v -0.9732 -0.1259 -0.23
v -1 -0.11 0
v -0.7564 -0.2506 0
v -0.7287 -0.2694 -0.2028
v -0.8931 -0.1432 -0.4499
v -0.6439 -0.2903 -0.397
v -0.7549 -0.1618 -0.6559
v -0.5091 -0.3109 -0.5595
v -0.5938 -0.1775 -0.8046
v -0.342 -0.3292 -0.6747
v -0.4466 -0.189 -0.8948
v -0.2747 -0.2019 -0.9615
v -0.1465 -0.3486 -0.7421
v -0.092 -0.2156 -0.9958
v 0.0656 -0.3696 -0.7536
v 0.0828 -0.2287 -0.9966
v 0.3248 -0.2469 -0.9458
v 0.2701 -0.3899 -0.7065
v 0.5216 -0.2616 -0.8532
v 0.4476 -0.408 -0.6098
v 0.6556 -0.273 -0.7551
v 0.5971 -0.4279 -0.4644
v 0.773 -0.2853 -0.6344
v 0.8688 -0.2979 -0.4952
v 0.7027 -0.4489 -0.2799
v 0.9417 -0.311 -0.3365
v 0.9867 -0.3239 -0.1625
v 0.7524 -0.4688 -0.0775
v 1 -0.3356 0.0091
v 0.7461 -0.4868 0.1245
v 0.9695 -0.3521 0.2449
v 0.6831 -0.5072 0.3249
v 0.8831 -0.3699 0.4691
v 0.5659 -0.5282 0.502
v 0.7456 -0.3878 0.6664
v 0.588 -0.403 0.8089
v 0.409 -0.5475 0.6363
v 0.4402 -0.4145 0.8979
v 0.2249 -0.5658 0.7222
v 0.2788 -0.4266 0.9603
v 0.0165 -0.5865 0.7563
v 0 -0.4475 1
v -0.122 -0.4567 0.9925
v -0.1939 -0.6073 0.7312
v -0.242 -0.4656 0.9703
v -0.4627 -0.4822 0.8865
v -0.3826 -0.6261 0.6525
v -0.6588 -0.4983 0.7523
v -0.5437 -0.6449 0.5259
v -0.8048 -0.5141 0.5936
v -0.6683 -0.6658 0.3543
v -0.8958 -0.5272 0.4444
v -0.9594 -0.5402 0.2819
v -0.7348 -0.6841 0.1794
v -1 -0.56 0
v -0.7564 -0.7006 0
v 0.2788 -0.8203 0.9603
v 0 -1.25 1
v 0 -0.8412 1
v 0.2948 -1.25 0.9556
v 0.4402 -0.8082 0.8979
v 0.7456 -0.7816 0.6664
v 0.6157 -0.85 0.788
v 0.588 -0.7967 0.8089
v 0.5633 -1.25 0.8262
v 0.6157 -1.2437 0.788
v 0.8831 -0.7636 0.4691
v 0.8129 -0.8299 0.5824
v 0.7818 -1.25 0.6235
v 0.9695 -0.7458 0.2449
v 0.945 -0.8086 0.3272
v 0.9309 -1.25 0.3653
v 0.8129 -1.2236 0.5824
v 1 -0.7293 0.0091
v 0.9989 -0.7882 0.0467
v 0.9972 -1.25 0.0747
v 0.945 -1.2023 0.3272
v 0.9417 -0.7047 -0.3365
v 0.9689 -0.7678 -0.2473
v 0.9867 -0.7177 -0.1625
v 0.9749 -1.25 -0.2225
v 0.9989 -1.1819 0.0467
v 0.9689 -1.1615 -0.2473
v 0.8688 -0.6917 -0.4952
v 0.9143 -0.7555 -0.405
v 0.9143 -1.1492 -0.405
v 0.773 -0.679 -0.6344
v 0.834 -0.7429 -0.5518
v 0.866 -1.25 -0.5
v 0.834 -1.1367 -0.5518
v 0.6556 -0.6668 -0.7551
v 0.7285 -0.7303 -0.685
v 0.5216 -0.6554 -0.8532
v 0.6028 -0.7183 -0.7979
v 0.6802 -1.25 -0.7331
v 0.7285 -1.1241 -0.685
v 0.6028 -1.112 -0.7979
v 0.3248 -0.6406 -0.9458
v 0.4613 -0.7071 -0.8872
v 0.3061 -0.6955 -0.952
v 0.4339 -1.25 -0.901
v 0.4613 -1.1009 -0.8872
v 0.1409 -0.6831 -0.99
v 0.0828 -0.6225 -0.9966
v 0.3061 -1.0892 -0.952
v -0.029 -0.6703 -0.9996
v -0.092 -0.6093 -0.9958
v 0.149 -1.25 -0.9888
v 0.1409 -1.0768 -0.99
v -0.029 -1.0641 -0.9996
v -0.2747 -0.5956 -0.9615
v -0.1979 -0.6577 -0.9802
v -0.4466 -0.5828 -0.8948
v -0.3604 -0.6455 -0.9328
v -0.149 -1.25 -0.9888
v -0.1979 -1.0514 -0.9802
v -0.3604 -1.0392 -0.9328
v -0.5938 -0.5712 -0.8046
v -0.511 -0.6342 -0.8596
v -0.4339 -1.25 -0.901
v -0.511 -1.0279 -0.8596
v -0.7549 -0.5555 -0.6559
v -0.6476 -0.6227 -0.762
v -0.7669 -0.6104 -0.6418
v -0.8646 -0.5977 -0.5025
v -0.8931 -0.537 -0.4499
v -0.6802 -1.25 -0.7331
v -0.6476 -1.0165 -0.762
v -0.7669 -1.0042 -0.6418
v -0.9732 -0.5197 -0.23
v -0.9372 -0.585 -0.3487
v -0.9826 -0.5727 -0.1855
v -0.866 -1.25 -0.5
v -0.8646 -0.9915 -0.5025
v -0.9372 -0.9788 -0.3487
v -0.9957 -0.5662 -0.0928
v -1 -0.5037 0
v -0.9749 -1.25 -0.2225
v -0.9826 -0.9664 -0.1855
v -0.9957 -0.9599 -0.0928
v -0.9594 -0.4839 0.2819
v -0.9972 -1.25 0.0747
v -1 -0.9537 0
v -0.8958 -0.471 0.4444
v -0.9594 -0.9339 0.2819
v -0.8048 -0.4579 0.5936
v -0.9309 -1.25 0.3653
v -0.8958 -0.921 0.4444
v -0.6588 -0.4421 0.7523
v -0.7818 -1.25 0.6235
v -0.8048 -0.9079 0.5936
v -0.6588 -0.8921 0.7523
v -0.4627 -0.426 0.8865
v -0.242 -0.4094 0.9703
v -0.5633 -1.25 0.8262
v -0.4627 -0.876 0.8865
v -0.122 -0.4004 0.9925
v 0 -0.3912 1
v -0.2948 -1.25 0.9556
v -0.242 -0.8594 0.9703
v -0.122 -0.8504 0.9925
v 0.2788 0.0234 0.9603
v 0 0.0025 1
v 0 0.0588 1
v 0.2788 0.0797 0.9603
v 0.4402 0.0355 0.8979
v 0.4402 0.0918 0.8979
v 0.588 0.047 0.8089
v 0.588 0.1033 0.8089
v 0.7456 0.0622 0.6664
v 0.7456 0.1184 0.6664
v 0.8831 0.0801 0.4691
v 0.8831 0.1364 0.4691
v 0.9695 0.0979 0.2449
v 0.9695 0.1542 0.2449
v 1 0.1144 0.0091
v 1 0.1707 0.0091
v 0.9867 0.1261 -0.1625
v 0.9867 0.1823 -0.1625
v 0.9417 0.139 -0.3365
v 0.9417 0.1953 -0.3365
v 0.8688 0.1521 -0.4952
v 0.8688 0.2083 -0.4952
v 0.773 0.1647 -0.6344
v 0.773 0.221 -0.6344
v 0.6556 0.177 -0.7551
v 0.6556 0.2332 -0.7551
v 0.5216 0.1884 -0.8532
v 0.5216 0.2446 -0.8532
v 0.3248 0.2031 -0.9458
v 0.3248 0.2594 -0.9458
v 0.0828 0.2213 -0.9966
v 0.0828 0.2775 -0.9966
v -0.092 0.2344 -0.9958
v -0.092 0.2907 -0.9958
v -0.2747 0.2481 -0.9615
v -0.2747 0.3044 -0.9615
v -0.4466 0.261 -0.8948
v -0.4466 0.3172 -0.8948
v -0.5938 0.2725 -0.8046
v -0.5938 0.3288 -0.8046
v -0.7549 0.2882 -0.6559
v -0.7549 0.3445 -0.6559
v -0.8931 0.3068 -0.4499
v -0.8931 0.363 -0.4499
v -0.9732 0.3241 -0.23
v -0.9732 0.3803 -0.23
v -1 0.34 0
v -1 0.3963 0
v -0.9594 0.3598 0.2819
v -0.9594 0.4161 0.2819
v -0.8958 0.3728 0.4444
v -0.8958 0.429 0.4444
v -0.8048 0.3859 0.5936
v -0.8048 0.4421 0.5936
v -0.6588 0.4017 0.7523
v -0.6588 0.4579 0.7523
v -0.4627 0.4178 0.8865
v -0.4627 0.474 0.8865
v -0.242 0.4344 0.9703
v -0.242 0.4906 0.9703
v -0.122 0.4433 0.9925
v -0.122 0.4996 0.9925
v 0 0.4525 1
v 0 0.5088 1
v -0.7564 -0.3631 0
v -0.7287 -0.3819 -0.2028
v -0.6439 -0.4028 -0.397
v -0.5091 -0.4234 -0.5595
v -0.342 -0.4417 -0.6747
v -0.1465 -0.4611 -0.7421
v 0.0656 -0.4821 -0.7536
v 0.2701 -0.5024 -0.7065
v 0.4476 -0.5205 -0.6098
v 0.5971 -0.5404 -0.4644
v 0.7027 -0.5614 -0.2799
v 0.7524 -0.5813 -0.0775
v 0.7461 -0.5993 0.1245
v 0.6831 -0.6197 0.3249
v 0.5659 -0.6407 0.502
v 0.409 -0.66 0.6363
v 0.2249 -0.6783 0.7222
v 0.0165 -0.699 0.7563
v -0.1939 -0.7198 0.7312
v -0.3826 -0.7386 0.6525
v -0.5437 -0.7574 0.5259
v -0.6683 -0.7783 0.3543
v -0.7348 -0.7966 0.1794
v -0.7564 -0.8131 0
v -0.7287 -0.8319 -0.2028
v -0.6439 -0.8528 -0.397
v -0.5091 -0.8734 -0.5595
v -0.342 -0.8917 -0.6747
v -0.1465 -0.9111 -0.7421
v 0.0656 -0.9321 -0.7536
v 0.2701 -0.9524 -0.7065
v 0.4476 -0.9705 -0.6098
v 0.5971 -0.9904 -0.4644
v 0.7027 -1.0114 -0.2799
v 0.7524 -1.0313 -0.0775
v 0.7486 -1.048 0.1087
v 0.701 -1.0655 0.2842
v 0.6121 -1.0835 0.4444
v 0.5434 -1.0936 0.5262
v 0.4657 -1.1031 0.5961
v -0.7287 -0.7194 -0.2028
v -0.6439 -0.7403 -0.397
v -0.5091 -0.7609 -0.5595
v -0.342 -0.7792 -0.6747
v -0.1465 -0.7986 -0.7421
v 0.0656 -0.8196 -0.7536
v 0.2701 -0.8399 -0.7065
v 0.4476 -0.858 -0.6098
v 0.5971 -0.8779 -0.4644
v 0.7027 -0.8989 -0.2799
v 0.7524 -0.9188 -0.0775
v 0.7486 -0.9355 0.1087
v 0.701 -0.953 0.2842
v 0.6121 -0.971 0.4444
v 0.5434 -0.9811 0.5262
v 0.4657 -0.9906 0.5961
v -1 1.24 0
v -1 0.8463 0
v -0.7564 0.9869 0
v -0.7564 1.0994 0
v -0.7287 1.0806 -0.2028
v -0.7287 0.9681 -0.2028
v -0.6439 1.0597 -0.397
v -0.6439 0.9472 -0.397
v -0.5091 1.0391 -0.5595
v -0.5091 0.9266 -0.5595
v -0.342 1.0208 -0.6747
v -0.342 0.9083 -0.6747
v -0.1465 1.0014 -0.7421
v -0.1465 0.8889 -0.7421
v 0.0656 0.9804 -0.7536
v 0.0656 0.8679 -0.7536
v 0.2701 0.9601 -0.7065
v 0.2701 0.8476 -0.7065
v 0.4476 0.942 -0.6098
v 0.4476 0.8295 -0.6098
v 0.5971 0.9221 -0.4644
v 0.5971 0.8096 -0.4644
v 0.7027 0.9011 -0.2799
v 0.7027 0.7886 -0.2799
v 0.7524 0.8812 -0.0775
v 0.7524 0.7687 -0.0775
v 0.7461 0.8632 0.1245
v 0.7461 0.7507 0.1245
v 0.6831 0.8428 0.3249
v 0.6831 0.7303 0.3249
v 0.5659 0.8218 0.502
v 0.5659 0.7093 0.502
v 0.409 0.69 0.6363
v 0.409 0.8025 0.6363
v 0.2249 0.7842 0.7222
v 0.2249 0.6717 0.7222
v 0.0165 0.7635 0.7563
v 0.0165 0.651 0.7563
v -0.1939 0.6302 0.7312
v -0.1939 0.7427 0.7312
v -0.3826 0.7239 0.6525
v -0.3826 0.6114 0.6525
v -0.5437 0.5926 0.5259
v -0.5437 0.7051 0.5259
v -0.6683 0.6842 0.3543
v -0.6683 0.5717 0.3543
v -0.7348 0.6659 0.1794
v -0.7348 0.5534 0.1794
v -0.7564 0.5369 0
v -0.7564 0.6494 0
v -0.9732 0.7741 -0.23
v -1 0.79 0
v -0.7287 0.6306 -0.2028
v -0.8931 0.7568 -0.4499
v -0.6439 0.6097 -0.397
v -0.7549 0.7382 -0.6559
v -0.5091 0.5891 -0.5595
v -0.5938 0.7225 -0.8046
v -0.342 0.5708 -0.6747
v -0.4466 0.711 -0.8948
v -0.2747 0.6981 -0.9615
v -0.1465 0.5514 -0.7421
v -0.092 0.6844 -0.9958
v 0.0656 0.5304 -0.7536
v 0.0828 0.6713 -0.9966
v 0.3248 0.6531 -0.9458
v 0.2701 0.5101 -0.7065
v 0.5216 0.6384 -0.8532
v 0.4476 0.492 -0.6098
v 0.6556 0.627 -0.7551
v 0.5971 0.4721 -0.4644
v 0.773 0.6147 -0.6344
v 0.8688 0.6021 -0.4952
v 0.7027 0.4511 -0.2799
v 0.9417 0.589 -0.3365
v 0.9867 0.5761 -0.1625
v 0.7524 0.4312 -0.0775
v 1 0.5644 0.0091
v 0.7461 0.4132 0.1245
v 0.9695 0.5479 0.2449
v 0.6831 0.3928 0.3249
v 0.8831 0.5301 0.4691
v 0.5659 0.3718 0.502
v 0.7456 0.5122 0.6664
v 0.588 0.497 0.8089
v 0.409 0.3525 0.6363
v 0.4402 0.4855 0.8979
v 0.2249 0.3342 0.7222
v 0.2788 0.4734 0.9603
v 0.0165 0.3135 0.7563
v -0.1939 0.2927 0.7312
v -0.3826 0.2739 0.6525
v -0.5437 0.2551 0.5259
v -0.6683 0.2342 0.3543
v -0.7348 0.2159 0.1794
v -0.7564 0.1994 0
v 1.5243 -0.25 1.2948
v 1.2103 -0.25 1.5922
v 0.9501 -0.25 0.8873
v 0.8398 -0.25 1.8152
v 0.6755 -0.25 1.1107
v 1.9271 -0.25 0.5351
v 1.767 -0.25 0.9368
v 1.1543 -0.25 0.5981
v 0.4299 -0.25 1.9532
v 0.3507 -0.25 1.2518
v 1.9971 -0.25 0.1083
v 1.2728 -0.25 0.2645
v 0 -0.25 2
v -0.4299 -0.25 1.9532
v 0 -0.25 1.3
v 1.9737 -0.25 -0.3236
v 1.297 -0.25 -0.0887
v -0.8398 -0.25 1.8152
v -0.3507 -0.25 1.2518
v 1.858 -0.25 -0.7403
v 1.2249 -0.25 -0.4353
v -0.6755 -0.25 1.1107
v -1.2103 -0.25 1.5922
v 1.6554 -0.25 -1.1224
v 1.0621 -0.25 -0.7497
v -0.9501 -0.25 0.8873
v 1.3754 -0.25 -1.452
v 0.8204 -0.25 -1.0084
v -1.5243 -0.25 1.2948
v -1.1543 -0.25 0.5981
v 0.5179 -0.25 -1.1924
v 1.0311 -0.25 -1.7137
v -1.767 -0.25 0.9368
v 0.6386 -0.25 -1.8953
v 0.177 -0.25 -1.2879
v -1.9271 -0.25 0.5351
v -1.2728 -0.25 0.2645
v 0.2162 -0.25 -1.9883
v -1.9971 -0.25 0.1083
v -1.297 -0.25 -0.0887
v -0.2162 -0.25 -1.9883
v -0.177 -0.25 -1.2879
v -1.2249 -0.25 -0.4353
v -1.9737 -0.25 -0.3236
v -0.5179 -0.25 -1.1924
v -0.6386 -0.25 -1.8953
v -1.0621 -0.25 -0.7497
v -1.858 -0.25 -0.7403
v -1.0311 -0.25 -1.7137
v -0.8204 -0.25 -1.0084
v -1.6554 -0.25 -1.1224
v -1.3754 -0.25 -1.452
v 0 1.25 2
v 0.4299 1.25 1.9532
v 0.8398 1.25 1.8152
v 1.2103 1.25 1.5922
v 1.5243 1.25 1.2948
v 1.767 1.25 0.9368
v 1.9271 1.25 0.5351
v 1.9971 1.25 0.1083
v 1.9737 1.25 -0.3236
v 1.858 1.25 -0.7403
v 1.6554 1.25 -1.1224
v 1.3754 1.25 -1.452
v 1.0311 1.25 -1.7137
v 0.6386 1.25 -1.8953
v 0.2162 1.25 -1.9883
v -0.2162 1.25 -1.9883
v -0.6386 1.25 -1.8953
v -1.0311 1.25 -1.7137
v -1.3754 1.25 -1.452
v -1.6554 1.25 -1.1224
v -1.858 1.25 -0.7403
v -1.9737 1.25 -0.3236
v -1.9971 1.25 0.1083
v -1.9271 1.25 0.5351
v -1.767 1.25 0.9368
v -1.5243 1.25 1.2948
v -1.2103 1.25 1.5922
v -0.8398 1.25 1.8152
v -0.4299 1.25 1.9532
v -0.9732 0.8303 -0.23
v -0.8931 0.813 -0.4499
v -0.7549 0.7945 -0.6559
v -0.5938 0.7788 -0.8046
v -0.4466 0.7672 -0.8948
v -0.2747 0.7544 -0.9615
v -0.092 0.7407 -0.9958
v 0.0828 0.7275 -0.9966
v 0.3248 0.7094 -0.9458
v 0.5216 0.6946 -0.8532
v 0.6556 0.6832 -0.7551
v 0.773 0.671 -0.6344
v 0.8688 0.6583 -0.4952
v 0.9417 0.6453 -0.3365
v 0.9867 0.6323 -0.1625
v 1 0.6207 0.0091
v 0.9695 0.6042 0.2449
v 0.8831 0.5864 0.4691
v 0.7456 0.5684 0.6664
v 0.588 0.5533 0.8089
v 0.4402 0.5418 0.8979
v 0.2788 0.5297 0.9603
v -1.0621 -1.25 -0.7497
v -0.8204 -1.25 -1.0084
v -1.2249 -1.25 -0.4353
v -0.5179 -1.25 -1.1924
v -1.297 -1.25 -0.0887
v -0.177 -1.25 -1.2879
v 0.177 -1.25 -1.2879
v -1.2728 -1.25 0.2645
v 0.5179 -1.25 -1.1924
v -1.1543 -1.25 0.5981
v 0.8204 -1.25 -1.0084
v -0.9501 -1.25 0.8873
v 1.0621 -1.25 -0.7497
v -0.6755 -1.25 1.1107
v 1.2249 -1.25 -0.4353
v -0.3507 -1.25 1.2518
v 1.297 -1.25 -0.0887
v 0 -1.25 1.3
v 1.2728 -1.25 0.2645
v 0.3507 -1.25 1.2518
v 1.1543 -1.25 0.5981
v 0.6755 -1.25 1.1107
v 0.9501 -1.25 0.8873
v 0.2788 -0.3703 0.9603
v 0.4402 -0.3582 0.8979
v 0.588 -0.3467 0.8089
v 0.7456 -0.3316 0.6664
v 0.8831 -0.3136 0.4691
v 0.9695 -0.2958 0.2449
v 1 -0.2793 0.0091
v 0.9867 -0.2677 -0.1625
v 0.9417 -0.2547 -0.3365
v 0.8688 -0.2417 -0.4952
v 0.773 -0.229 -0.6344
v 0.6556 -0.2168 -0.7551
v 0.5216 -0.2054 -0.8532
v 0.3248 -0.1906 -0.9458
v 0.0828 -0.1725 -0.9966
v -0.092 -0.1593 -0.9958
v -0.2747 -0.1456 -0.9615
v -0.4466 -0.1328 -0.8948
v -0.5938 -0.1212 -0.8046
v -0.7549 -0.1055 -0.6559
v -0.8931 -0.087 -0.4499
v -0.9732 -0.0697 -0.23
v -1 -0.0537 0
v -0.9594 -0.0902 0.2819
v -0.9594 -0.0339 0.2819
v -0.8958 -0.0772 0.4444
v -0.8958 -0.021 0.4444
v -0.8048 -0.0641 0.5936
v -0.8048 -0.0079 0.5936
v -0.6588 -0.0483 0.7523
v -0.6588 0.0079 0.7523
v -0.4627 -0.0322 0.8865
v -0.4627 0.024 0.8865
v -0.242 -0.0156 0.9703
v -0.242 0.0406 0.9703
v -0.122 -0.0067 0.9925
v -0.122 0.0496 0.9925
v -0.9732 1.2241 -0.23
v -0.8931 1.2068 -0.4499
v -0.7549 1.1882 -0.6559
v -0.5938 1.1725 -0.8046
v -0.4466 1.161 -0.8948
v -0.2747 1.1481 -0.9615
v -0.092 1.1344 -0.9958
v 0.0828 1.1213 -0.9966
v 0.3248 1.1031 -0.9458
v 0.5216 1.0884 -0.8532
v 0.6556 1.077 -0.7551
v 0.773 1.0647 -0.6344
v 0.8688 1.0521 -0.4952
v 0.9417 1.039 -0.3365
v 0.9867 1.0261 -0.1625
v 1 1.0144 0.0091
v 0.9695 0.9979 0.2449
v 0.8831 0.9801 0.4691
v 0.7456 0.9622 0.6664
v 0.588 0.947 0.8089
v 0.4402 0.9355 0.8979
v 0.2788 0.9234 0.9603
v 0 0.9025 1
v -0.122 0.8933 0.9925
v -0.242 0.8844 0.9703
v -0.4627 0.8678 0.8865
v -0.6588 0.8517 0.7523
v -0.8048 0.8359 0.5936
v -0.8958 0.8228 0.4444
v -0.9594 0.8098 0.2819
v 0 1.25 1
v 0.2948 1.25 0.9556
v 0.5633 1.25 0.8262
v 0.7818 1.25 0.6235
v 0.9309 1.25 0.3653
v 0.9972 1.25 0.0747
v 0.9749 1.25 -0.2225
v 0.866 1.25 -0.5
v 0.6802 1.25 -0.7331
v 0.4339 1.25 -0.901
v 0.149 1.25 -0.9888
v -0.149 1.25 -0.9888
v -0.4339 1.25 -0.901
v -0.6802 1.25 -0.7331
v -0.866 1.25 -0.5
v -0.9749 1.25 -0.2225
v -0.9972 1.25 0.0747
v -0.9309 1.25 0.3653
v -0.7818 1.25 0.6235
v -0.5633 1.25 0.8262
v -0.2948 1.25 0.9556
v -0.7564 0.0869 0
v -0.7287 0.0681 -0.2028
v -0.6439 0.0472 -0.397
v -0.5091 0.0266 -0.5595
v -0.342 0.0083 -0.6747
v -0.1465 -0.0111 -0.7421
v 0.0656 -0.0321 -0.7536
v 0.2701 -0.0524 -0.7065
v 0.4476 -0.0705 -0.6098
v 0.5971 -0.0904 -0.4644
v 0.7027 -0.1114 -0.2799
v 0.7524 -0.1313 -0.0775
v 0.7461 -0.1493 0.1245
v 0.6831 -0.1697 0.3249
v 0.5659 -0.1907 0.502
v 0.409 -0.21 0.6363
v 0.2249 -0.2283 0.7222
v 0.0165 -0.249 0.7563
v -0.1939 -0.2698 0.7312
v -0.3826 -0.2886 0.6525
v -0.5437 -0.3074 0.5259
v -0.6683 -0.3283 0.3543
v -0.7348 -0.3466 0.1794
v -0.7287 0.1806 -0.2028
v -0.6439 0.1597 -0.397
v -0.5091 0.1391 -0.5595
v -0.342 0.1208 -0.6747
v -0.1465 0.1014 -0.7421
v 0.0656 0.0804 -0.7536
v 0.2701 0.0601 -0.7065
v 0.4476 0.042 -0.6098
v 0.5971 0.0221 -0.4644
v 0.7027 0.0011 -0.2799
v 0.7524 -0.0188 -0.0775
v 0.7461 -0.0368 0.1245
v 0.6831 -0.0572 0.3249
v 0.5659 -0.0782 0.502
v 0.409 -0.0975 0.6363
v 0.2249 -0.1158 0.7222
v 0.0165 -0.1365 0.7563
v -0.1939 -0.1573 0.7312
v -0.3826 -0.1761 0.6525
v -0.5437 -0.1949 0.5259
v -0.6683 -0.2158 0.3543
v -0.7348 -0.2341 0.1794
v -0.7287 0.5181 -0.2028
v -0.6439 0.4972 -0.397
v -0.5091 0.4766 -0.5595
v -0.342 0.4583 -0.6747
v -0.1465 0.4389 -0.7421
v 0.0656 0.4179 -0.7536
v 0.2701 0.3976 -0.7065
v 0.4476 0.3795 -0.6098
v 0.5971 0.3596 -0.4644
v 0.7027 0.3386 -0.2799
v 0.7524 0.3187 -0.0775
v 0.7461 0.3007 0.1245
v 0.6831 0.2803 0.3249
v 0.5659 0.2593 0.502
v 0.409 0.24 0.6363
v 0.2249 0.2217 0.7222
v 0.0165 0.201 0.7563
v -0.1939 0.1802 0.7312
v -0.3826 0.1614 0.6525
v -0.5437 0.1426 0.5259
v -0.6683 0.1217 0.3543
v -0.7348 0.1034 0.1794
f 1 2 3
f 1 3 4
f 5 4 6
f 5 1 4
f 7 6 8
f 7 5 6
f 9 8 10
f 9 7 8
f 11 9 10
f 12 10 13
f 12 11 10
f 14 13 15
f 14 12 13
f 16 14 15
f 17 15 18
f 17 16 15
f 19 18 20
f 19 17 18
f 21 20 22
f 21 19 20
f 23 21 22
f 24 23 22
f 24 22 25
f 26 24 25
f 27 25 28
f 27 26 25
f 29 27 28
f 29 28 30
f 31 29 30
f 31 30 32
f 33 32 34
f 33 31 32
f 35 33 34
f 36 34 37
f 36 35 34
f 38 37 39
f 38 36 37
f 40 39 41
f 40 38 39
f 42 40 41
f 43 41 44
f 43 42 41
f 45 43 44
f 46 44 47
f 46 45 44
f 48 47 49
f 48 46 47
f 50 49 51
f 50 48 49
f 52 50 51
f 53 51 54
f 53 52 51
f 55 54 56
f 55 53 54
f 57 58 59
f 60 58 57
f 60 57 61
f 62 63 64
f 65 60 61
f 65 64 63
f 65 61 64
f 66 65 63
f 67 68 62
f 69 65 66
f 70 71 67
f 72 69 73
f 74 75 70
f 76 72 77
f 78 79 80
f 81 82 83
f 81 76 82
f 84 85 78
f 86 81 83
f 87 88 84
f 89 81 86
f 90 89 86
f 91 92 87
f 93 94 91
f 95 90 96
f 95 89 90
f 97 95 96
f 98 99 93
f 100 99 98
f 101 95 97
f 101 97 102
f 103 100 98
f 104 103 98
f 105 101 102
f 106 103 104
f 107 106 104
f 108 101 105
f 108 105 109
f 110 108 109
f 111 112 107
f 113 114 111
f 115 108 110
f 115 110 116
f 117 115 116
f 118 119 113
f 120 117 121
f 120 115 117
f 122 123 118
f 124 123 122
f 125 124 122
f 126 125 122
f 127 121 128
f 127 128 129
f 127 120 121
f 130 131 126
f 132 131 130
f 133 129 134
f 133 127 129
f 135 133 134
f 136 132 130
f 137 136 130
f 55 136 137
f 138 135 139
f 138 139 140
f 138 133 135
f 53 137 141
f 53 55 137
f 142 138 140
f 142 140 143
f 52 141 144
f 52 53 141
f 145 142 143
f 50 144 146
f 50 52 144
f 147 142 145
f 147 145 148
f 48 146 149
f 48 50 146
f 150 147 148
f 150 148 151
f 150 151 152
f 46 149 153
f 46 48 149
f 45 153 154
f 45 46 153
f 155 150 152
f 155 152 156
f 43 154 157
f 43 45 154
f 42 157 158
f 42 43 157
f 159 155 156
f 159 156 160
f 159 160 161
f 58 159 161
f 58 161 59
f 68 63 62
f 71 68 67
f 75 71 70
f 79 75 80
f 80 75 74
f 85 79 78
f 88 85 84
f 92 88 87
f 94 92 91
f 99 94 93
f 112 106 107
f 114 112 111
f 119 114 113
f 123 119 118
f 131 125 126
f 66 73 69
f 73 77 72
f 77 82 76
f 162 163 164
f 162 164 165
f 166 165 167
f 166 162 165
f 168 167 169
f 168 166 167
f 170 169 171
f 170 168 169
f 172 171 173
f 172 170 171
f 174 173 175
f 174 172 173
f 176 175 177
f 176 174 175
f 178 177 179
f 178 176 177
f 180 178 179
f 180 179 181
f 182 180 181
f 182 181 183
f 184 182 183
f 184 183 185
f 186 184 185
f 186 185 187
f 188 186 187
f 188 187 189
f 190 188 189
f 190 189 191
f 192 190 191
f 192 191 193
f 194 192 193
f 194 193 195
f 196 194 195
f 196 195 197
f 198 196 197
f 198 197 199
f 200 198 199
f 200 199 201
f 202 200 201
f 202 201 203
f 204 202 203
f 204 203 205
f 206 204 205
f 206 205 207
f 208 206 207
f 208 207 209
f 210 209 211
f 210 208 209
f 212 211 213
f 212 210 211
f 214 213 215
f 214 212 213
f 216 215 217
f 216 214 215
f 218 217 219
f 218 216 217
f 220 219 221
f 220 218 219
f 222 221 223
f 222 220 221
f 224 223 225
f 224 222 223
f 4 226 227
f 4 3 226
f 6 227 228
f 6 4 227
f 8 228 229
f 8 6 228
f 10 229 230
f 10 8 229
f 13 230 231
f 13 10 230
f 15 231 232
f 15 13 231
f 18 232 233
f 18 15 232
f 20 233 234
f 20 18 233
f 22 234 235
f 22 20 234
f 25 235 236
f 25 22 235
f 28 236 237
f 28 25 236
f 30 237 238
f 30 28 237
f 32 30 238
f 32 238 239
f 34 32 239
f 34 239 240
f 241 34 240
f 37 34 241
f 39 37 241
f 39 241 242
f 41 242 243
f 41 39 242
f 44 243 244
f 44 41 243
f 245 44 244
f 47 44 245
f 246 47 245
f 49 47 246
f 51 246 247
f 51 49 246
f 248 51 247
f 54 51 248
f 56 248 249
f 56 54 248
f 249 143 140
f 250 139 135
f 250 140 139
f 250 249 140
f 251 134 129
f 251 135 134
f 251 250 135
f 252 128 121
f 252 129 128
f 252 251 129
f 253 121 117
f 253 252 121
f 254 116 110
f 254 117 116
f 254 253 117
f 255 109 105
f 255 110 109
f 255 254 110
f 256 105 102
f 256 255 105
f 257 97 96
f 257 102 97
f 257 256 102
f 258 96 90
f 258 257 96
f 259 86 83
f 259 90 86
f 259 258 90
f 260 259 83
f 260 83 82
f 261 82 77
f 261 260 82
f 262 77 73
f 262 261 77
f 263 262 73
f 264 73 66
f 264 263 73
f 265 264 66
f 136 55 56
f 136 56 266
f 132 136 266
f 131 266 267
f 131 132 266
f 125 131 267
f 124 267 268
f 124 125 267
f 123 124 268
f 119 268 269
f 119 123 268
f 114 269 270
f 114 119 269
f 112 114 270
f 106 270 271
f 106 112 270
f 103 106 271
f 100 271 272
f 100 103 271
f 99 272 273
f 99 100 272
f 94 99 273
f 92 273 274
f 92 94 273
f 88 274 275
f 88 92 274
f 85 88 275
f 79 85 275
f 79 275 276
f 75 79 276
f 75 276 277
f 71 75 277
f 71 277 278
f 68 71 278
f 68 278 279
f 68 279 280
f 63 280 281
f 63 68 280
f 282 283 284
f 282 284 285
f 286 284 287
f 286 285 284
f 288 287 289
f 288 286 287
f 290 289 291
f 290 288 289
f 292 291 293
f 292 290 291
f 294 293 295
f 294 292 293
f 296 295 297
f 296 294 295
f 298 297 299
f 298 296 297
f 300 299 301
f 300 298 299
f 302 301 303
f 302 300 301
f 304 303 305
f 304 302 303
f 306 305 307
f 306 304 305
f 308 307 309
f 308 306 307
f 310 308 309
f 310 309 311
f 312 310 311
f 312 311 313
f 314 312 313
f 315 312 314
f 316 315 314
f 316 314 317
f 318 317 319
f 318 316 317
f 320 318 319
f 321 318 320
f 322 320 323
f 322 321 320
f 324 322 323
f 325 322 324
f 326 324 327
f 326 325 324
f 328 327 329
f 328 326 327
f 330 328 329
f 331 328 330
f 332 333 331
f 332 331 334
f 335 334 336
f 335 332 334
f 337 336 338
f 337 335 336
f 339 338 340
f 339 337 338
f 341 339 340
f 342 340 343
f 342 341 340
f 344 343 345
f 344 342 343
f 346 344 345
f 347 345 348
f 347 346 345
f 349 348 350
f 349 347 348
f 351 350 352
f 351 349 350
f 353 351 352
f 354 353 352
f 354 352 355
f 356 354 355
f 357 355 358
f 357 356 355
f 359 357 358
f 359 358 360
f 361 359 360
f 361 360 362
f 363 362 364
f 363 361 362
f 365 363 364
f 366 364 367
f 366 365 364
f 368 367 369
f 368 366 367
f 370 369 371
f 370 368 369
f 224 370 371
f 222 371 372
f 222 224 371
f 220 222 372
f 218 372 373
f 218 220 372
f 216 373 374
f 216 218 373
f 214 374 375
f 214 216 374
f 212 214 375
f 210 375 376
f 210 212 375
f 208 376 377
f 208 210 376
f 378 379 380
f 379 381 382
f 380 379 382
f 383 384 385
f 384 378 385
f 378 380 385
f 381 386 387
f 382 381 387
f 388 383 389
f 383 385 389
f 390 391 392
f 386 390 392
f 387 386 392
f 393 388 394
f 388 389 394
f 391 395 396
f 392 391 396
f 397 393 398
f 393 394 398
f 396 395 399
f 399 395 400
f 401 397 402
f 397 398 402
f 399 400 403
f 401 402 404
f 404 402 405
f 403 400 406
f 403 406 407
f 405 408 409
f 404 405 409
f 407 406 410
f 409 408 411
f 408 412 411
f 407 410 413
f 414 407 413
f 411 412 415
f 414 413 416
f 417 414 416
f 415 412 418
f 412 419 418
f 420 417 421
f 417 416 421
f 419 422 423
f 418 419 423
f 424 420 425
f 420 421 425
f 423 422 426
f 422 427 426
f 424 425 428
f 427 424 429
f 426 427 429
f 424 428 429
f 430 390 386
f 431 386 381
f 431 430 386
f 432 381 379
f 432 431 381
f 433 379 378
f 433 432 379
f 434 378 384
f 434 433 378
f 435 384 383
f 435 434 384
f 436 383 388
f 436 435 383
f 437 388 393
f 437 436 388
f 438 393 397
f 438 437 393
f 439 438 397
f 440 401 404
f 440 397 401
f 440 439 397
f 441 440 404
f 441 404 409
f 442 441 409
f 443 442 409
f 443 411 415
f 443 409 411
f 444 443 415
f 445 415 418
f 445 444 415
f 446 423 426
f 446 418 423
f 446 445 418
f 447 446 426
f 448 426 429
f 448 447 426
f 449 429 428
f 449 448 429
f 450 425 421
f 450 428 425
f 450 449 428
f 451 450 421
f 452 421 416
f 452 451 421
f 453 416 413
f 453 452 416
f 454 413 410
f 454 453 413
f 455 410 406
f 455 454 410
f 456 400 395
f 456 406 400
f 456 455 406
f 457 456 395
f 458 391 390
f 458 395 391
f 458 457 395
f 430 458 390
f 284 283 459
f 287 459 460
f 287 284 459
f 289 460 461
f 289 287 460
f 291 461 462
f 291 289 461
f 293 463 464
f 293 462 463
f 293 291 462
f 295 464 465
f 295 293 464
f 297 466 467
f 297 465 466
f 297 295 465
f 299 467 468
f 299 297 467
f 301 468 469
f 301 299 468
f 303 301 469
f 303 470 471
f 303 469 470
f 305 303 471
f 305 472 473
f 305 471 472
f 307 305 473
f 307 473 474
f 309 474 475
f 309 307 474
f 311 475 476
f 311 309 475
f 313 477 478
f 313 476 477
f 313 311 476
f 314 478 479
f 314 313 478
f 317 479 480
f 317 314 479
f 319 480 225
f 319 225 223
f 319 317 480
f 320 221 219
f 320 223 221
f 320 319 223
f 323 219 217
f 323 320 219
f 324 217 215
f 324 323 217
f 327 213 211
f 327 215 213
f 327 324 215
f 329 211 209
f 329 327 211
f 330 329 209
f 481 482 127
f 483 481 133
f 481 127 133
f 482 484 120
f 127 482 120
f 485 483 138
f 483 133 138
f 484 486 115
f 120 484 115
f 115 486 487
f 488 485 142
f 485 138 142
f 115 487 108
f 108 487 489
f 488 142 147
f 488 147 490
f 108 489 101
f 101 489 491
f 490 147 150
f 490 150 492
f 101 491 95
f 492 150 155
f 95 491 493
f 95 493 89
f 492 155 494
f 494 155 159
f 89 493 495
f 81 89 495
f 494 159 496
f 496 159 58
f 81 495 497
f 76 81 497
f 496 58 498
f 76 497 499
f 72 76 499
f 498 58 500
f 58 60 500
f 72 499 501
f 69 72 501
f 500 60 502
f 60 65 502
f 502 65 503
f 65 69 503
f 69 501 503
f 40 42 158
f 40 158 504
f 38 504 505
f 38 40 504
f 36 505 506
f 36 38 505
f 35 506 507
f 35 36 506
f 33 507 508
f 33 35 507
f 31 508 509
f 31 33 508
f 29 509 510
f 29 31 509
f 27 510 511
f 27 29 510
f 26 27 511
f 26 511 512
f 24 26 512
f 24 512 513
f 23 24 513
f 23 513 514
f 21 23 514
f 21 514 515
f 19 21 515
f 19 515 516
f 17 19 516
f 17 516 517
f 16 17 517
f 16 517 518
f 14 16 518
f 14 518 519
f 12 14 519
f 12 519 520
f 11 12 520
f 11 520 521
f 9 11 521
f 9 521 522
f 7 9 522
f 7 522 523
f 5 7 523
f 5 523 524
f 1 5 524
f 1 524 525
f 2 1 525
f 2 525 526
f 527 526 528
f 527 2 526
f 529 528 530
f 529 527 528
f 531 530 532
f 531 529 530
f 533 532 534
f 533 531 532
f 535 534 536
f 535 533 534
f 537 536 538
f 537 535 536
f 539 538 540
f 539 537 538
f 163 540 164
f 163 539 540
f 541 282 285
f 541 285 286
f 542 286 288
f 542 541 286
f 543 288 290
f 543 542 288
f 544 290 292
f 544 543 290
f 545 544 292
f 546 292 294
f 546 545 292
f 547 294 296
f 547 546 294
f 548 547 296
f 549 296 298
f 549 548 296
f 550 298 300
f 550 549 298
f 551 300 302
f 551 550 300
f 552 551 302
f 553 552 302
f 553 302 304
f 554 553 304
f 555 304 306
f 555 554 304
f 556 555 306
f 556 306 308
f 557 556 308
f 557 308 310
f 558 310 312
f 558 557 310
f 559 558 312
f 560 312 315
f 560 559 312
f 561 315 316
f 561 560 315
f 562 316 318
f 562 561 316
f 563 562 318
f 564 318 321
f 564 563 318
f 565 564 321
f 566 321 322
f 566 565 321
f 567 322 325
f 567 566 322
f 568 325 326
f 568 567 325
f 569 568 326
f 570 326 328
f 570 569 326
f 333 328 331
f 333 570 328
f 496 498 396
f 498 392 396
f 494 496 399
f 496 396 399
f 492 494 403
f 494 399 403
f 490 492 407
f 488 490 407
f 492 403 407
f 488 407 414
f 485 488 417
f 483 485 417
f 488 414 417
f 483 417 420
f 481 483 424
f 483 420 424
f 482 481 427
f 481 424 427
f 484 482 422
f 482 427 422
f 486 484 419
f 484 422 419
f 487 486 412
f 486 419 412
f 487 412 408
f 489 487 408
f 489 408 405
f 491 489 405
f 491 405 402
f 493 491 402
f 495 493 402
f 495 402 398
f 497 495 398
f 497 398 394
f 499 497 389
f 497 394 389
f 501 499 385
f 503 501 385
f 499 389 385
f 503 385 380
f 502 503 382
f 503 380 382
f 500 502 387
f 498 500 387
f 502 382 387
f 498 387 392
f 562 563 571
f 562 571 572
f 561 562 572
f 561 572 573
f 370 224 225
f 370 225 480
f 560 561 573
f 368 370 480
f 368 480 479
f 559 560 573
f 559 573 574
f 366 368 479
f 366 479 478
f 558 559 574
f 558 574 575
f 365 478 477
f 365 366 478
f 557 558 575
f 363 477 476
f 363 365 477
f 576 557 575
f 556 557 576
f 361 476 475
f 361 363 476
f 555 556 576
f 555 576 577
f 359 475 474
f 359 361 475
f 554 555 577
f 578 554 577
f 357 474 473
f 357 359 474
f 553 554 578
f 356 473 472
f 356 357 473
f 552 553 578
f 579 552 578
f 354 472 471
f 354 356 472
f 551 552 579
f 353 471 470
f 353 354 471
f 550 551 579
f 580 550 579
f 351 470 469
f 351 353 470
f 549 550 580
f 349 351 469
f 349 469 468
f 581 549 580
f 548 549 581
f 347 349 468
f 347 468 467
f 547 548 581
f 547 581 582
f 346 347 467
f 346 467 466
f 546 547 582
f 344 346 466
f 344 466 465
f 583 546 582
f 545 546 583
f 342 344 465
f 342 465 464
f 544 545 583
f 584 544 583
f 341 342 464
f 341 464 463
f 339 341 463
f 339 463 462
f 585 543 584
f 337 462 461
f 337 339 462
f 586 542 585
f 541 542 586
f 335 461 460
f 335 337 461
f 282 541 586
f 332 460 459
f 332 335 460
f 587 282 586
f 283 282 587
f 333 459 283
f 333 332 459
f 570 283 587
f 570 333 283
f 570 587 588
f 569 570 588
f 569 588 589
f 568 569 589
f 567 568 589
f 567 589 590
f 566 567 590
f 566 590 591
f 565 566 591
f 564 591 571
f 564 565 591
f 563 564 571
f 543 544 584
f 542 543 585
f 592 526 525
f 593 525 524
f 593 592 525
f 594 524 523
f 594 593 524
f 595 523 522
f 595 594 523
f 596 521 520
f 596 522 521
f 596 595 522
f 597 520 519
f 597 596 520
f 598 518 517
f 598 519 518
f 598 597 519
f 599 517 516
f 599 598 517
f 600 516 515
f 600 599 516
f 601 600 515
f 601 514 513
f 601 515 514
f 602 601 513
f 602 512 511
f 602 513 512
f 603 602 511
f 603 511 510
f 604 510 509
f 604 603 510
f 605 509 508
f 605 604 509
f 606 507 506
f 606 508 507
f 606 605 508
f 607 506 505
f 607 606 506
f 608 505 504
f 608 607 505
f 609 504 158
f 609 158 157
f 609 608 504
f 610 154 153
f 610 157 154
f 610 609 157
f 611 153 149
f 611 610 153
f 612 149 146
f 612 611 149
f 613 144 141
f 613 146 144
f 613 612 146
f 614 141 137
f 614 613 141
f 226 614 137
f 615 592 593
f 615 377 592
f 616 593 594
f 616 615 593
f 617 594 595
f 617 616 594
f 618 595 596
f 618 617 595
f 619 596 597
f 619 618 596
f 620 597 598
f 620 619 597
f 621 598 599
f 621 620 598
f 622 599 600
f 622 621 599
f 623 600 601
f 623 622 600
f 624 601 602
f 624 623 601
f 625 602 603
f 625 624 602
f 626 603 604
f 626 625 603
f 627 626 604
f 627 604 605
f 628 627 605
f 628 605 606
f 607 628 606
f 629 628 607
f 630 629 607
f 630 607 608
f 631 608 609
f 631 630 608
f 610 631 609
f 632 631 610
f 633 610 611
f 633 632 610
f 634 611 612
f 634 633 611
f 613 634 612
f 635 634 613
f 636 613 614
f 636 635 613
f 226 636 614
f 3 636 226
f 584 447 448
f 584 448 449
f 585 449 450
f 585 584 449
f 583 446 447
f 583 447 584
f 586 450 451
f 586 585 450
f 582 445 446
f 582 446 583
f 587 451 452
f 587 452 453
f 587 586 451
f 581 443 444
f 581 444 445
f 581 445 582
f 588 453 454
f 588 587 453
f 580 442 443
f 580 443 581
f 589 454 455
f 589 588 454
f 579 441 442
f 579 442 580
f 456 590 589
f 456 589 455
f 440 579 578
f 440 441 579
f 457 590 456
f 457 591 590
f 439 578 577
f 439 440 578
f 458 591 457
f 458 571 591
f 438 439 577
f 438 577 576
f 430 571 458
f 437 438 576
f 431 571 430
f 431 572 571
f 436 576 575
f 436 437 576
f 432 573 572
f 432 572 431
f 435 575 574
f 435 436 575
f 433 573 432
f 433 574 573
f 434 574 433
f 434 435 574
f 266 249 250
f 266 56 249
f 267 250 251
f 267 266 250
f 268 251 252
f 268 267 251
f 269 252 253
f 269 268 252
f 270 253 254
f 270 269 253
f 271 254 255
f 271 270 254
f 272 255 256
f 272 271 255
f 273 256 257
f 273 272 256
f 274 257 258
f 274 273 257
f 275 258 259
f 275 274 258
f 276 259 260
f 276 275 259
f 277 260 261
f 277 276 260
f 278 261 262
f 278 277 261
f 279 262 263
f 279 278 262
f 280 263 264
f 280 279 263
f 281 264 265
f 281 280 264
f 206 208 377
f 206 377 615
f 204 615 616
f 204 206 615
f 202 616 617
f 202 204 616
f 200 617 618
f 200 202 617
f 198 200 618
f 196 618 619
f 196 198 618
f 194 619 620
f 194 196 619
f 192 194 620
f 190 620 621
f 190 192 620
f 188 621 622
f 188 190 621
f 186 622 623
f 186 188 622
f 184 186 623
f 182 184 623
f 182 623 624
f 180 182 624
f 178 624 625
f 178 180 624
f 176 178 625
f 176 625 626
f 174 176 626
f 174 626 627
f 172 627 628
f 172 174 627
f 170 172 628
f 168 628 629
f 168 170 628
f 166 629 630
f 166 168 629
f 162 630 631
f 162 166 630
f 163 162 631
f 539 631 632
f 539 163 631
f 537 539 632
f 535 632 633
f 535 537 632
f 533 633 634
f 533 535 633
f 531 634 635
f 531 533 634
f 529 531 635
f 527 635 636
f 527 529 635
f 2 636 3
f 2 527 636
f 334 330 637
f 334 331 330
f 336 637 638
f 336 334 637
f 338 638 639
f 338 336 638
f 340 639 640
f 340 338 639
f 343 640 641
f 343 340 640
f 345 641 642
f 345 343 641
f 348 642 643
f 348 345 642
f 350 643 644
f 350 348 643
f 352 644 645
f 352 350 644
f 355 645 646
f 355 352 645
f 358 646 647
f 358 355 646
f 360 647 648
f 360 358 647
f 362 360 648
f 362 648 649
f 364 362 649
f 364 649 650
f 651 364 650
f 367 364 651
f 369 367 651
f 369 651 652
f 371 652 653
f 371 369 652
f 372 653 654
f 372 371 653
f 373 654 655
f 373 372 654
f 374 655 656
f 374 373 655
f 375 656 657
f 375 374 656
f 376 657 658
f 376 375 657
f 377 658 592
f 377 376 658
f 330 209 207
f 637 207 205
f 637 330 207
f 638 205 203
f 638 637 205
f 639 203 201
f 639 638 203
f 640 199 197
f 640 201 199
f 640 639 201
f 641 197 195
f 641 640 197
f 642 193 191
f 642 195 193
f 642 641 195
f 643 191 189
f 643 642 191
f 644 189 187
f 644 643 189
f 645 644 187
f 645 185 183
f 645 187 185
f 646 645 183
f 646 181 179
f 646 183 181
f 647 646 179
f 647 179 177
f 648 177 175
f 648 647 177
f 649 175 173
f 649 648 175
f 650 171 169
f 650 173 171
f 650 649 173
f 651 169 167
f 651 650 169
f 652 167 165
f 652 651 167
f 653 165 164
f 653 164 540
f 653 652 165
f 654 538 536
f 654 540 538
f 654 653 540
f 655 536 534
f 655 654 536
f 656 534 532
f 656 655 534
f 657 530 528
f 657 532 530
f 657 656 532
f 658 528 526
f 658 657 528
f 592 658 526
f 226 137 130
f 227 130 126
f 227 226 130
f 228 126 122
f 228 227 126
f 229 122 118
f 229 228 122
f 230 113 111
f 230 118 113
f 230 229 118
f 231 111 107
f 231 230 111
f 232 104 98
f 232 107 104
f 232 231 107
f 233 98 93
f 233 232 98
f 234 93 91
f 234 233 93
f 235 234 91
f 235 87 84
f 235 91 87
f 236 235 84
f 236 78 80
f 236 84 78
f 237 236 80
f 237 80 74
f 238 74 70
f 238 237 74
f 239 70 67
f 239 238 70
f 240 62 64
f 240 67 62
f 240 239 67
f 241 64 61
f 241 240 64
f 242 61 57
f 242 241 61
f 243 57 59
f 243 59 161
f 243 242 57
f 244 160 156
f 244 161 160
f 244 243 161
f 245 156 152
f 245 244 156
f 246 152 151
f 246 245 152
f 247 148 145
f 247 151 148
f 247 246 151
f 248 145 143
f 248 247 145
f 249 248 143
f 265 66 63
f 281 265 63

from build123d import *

# Parameters (mm, degrees)
BASES_R       = 2
BASES_R_2     = 1
BASE_DEPTH    = 1.25
THREAD1_PITCH = 0.45
SKETCH1_W     = 0.7
SKETCH1_H     = 1


with BuildPart() as part:
    # BaseS → Base (new, symmetric)
    with BuildSketch(Plane(origin=(0, 0, 0), x_dir=(1, 0, 0), z_dir=(0, 1, 0))):
        with Locations(Location((0, 0, 0), (0, 0, 270))):
            Circle(BASES_R)
        with Locations(Location((0, 0, 0), (0, 0, 270))):
            Circle(BASES_R_2, mode=Mode.SUBTRACT)
    extrude(amount=BASE_DEPTH, both=True)

    # Thread1: the profile of Thread Profile1 profile screwed along a right-hand helix of 4.644444 turns, 6 arcs to a turn; built about Z, then put on its axis
    thread1_z = Axis((0, 0, 0), (0, 0, 1))
    thread1_corners = [(1.0003, 0, -0.000173205), (1.0003, 0, 0.393923204), (0.756430356, 0, 0.253124999), (0.756430356, 0, 0.140624999)]
    with BuildLine(mode=Mode.PRIVATE) as thread1_profile:
        Line(thread1_corners[0], thread1_corners[1])
        Line(thread1_corners[1], thread1_corners[2])
        Line(thread1_corners[2], thread1_corners[3])
        Line(thread1_corners[3], thread1_corners[0])
    thread1_cap = Face(thread1_profile.wire())
    thread1_turn_angles = [0, 30, 60, 90, 120, 150, 180, 210, 240, 270, 300, 330, 360]
    thread1_turn_weights = [1, 0.8660254037844387, 1, 0.8660254037844387, 1, 0.8660254037844387, 1, 0.8660254037844387, 1, 0.8660254037844387, 1, 0.8660254037844387, 1]
    thread1_turn_rails = [Edge.make_bspline([Vector(p[0], p[1], 0).rotate(thread1_z, thread1_turn_angles[k]) / thread1_turn_weights[k] + Vector(0, 0, p[2] + THREAD1_PITCH * thread1_turn_angles[k] / 360) for k in range(13)], [0, 0, 0, 1, 1, 2, 2, 3, 3, 4, 4, 5, 5, 6, 6, 6], 2, thread1_turn_weights) for p in thread1_corners]
    thread1_turn_sides = [Face.make_surface_from_curves(thread1_turn_rails[p[0]], thread1_turn_rails[p[1]]) for p in [(0, 1), (1, 2), (2, 3), (3, 0)]]
    thread1_last_angles = [1440, 1470, 1500, 1530, 1560, 1590, 1620, 1646, 1672]
    thread1_last_weights = [1, 0.8660254037844387, 1, 0.8660254037844387, 1, 0.8660254037844387, 1, 0.8987940462991653, 1]
    thread1_last_rails = [Edge.make_bspline([Vector(p[0], p[1], 0).rotate(thread1_z, thread1_last_angles[k]) / thread1_last_weights[k] + Vector(0, 0, p[2] + THREAD1_PITCH * thread1_last_angles[k] / 360) for k in range(9)], [0, 0, 0, 1, 1, 2, 2, 3, 3, 4, 4, 4], 2, thread1_last_weights) for p in thread1_corners]
    thread1_last_sides = [Face.make_surface_from_curves(thread1_last_rails[p[0]], thread1_last_rails[p[1]]) for p in [(0, 1), (1, 2), (2, 3), (3, 0)]]
    thread1 = Plane(origin=(0, 1.24, 0), x_dir=(-1, 0, 0), z_dir=(0, -1, 0)) * Solid(Shell([*[p.moved(Location((0, 0, THREAD1_PITCH * i))) for i in range(4) for p in thread1_turn_sides], *thread1_last_sides, thread1_cap, thread1_cap.rotate(thread1_z, 1672).moved(Location((0, 0, THREAD1_PITCH * 1672 / 360)))]))
    add(thread1)

    # Sketch1 → Cut-Revolve1 (revolve, cut)
    with BuildSketch(Plane.XY, mode=Mode.PRIVATE) as cut_revolve1_sk:
        with Locations((1.65, -0.75)):
            Rectangle(SKETCH1_W, SKETCH1_H)
    revolve(cut_revolve1_sk.sketch.rotate(Axis((0, 1.424121105, 0), (0, -1, 0)), 90), axis=Axis((0, 1.424121105, 0), (0, -1, 0)), mode=Mode.SUBTRACT)


solid = part.part
